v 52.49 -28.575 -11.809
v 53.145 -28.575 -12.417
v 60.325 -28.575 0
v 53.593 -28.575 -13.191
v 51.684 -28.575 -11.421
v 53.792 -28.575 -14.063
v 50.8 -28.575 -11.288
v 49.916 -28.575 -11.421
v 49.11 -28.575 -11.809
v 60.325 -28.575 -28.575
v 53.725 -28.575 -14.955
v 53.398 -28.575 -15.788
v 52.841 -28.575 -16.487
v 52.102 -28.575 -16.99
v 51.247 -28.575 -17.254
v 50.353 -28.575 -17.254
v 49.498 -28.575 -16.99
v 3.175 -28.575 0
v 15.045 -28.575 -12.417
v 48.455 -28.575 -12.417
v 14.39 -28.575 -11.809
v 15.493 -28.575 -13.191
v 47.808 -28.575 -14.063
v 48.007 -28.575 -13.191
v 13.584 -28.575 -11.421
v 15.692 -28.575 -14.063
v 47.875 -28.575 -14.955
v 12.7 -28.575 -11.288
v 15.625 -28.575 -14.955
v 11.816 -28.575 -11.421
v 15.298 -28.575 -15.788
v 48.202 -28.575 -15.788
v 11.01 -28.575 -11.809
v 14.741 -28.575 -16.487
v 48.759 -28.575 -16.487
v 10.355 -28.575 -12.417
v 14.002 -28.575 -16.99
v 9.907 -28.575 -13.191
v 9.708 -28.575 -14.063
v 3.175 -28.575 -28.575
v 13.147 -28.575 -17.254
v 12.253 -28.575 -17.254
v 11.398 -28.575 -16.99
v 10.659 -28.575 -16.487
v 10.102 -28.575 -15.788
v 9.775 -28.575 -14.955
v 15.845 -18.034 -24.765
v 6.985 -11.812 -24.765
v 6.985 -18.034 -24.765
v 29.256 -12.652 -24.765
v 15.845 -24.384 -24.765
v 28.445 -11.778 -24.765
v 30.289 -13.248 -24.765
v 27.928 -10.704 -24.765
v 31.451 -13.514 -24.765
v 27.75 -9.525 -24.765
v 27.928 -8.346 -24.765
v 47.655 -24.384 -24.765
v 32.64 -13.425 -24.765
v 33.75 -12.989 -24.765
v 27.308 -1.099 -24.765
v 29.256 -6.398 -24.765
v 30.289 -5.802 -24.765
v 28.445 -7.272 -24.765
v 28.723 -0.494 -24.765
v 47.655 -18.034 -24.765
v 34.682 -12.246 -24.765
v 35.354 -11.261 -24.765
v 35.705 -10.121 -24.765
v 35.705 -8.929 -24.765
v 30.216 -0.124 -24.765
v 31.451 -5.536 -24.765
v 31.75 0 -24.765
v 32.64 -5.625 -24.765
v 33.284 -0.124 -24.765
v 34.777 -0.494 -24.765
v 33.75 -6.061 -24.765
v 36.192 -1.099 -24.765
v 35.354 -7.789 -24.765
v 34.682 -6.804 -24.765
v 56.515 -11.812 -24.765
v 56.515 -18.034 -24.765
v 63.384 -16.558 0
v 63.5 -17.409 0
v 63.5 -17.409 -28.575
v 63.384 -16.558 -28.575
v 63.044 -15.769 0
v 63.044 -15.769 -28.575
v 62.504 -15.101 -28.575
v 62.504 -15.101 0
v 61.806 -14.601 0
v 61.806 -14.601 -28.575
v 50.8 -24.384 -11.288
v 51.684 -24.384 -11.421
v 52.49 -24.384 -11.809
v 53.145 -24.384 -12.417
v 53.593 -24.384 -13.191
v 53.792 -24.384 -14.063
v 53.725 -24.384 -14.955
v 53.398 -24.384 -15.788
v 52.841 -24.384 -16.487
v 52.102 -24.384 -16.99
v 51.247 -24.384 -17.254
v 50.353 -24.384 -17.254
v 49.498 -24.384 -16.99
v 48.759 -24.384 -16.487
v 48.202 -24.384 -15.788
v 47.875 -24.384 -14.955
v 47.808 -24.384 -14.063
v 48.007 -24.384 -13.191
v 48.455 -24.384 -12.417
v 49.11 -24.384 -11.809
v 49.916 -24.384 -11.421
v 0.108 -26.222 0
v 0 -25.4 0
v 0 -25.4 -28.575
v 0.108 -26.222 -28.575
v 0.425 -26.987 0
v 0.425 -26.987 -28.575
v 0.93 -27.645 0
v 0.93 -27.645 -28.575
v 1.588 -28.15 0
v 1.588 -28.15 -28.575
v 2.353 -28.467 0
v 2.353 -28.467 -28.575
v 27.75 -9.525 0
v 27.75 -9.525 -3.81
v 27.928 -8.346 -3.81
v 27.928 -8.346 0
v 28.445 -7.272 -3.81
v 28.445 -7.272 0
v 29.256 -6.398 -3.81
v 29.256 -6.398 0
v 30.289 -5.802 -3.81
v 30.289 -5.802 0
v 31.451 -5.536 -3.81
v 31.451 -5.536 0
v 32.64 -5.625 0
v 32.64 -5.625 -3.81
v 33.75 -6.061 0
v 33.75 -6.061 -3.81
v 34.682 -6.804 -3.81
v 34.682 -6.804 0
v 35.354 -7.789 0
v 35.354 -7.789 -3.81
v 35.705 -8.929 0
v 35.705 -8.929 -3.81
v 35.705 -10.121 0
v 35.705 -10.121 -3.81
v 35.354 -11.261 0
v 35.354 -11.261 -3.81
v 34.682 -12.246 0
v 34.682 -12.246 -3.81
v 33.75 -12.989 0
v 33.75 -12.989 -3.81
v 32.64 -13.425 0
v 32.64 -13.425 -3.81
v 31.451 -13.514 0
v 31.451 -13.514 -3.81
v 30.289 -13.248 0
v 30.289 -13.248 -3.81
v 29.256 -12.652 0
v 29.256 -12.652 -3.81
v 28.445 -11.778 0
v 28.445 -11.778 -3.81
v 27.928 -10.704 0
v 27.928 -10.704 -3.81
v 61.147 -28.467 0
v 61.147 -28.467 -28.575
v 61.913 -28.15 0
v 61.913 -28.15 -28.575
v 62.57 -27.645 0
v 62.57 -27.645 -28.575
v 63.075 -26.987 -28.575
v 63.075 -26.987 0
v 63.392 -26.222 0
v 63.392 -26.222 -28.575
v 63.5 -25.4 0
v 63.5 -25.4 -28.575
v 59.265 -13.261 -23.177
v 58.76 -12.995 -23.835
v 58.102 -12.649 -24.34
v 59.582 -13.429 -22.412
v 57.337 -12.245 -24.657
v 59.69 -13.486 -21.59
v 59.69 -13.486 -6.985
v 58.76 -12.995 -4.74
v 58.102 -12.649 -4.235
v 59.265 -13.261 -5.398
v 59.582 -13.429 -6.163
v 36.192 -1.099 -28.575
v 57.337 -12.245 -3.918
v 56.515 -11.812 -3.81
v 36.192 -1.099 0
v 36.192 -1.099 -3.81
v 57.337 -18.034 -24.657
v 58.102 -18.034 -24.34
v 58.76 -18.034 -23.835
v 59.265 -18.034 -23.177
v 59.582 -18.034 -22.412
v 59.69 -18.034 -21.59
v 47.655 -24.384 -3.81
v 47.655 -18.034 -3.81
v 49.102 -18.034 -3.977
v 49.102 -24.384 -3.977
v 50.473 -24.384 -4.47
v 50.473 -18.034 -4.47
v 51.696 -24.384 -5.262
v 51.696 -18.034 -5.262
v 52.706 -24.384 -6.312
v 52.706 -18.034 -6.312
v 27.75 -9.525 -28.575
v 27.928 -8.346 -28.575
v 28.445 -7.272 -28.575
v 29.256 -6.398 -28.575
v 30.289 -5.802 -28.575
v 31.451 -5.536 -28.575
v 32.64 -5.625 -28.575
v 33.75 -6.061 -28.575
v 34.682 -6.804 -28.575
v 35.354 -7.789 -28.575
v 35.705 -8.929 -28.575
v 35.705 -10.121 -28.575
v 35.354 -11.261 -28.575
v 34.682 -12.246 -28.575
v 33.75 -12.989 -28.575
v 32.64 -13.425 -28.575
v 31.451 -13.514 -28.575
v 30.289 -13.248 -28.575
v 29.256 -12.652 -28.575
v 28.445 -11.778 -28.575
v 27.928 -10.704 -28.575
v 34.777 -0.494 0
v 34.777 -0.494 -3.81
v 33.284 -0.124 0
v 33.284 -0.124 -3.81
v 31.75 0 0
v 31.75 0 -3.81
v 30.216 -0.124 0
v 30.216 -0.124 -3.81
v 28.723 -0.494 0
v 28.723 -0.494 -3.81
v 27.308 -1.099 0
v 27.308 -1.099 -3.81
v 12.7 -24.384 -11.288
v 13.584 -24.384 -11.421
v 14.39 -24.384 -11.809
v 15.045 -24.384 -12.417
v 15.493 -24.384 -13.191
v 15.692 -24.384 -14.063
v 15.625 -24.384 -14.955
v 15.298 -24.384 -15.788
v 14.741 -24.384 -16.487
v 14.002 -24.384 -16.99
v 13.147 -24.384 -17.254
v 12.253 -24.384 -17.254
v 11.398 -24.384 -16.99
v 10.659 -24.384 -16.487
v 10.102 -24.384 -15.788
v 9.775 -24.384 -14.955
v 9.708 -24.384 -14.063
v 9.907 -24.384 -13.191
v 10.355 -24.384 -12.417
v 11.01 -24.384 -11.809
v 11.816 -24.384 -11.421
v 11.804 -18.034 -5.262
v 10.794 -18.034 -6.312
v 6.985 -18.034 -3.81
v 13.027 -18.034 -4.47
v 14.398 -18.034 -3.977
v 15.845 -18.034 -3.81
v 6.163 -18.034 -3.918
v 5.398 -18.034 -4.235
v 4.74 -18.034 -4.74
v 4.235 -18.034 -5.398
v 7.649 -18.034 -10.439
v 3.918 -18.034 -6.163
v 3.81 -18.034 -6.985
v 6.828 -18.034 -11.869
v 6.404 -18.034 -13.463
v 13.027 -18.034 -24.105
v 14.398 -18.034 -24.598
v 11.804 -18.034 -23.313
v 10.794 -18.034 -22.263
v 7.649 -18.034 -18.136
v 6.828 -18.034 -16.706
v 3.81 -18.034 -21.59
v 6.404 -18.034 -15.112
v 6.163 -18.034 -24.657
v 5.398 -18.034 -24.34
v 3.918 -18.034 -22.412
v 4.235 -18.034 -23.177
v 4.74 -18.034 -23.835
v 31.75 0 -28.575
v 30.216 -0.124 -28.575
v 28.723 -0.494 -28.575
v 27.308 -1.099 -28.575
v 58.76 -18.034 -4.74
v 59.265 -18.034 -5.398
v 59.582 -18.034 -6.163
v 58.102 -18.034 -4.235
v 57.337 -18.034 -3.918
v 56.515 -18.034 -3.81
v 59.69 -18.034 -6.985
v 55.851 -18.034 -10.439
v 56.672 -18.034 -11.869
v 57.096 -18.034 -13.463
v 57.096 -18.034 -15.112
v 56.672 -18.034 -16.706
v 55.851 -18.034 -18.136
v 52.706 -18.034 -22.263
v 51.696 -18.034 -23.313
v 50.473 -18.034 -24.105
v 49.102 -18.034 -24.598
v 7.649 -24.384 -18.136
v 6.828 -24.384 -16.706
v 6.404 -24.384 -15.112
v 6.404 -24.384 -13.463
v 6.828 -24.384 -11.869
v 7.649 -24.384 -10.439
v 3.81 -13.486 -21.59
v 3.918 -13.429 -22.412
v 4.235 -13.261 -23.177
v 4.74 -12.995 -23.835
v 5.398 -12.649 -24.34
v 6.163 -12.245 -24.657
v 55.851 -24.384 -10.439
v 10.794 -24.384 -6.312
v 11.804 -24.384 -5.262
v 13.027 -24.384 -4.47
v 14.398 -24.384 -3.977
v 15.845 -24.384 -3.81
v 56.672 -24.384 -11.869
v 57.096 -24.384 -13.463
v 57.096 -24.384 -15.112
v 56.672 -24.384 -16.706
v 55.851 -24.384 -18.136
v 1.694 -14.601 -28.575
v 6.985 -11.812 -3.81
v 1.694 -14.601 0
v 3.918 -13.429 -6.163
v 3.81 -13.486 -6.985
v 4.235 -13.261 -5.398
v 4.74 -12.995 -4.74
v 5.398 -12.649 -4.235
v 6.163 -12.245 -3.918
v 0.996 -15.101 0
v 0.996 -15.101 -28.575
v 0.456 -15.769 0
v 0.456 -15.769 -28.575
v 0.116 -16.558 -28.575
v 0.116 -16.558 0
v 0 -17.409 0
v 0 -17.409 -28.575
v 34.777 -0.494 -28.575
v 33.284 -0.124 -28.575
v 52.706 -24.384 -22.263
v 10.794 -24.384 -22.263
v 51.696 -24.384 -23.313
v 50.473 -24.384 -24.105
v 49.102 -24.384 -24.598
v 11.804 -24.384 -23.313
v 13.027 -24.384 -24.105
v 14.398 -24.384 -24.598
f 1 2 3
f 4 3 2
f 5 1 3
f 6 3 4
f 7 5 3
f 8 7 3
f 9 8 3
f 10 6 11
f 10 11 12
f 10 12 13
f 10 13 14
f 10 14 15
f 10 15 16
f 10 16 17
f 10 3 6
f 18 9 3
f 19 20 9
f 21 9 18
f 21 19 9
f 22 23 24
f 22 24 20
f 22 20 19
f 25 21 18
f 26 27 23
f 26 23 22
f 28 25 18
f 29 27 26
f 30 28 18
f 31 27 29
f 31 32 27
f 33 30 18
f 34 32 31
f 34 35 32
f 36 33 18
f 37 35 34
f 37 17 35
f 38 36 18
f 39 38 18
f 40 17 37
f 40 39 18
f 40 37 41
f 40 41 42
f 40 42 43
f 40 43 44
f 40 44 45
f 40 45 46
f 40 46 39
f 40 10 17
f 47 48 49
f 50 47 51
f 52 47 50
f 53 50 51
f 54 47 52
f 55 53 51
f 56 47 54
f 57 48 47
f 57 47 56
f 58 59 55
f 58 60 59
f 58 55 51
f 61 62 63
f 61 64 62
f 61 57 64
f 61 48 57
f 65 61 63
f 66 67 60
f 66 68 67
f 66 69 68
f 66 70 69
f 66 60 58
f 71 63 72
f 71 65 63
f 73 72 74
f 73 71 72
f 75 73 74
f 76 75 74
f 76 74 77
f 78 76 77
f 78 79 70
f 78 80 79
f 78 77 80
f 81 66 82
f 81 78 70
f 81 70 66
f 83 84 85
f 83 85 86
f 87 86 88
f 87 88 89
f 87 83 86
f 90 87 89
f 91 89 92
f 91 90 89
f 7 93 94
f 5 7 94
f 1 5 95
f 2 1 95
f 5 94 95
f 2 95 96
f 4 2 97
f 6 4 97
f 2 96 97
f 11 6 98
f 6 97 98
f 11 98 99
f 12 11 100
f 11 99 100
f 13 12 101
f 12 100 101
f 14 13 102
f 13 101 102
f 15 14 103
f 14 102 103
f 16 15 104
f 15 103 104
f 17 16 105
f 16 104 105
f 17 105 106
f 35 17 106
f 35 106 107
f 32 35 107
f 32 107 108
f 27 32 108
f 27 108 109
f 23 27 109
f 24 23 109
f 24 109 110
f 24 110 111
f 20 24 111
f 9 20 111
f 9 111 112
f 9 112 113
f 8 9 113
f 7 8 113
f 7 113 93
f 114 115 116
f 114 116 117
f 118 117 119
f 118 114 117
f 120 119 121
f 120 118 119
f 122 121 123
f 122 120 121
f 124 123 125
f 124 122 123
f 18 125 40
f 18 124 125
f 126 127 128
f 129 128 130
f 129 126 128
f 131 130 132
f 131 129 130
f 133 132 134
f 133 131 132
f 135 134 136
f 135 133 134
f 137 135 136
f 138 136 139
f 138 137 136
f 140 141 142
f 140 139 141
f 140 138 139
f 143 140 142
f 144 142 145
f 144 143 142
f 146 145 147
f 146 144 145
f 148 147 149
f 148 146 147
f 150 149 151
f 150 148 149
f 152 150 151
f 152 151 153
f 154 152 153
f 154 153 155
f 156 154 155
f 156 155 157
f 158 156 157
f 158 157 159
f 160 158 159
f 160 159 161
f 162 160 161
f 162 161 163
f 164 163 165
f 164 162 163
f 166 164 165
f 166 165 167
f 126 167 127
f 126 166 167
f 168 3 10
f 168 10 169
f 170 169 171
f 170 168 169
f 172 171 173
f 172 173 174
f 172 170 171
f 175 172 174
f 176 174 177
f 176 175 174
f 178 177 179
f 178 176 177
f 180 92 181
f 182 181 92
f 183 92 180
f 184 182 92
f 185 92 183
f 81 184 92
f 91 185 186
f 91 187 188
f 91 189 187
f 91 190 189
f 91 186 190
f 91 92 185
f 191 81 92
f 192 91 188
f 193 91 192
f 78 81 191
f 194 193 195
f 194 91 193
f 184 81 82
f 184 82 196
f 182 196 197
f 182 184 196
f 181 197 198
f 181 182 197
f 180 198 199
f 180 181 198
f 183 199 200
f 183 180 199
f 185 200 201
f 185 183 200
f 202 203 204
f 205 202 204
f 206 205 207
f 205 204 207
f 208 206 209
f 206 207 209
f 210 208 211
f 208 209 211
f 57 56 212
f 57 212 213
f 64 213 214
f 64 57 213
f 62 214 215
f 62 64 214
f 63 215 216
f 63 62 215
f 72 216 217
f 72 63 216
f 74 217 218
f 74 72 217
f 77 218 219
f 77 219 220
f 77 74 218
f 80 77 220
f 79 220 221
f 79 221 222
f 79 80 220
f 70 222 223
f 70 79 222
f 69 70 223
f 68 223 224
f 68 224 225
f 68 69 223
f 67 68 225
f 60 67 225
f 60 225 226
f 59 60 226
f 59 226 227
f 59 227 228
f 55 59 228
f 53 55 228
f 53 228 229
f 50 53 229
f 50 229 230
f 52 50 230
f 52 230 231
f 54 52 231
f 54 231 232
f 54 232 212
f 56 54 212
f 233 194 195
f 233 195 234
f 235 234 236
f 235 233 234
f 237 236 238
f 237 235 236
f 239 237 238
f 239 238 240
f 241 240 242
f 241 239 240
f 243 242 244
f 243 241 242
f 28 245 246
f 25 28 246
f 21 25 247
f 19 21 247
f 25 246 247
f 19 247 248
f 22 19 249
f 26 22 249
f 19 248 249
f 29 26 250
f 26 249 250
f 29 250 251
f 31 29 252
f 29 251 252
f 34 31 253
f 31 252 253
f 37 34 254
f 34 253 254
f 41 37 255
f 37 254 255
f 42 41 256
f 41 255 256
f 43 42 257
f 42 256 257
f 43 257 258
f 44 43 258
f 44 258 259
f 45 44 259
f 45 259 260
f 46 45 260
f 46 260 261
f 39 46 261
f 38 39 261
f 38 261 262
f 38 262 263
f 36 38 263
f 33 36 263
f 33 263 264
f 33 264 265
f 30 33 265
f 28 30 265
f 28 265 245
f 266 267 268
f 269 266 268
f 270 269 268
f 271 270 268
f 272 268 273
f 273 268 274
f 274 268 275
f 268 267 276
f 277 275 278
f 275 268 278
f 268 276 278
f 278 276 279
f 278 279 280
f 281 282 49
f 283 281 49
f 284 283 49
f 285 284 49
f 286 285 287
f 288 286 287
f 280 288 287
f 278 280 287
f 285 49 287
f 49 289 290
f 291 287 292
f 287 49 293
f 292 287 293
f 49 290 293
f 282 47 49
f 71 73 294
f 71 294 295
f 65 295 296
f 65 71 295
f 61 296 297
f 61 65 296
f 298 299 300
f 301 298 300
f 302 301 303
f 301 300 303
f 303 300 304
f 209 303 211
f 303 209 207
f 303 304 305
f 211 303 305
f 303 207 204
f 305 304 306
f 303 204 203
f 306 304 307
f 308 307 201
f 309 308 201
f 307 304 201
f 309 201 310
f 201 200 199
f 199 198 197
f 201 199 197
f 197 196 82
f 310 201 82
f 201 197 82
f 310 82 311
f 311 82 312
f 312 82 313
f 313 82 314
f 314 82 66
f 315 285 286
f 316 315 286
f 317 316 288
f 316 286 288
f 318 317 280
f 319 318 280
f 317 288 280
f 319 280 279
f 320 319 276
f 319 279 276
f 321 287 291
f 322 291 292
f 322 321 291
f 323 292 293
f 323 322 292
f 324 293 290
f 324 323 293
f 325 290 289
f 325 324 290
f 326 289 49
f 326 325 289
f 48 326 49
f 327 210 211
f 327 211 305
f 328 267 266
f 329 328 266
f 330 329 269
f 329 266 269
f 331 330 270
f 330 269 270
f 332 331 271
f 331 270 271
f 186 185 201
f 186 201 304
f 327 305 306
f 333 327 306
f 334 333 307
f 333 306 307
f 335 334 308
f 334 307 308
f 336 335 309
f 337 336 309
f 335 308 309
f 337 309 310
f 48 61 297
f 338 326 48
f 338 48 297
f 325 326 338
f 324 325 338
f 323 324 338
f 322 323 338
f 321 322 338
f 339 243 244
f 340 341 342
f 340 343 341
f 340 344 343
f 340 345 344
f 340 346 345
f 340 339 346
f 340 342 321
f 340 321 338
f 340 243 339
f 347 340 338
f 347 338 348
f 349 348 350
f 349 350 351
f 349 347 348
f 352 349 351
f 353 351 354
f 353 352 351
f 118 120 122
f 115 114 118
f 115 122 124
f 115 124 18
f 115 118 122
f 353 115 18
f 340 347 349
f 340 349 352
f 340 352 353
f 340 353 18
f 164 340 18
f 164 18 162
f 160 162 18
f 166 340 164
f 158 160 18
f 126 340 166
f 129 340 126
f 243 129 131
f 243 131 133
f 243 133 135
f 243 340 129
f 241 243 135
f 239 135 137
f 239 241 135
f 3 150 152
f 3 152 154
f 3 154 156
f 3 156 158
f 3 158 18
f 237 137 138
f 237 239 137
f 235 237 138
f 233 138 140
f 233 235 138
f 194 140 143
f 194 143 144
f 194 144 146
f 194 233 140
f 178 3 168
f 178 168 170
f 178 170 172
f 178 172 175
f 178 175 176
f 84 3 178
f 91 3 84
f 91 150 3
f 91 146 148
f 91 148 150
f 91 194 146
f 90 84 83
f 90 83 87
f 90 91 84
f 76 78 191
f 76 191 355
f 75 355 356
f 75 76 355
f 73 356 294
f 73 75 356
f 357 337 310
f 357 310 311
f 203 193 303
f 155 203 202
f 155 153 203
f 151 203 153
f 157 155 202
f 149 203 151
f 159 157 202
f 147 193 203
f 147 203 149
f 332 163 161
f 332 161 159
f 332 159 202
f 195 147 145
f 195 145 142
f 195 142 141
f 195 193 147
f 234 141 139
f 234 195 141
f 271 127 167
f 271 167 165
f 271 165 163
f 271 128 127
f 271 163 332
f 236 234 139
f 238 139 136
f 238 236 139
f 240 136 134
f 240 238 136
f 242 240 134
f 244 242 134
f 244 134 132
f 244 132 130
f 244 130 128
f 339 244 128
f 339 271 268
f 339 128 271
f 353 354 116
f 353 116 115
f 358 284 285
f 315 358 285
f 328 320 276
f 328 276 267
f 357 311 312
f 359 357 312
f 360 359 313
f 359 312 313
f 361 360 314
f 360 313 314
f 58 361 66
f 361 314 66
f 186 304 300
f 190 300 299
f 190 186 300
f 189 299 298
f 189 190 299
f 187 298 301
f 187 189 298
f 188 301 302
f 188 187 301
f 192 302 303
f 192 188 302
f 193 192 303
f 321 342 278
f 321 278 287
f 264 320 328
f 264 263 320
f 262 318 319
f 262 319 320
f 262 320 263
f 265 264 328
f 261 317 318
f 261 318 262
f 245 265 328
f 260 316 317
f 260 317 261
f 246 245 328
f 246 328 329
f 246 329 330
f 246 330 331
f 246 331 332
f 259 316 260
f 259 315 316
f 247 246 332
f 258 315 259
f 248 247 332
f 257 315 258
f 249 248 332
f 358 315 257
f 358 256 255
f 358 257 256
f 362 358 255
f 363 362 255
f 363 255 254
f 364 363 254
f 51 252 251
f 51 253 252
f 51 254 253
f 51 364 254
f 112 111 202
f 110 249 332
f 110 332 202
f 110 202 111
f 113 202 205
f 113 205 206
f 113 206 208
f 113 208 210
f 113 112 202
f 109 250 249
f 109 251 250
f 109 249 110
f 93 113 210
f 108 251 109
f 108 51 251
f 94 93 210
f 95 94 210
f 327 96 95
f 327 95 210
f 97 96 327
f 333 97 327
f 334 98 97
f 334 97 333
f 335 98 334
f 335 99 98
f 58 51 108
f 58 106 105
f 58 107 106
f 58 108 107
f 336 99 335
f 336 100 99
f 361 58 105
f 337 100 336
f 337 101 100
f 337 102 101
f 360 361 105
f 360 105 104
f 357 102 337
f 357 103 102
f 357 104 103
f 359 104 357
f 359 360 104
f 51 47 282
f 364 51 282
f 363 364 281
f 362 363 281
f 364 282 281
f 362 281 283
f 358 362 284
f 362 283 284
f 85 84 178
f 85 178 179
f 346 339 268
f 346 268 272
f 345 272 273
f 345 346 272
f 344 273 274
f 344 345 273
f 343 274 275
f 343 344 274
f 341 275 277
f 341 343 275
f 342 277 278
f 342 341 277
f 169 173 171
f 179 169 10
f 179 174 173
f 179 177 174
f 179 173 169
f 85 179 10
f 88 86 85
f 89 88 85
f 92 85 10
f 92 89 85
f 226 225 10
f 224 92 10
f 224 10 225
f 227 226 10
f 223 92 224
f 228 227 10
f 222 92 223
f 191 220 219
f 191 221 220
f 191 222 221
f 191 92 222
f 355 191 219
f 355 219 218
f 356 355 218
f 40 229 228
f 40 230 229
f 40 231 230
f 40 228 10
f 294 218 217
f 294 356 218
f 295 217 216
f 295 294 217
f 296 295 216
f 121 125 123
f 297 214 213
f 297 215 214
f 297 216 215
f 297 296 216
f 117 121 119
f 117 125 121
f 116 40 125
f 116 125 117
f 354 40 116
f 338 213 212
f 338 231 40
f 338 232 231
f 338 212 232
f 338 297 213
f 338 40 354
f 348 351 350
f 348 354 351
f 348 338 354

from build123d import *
from OCP.BRepAlgoAPI import BRepAlgoAPI_Cut
from OCP.TopTools import TopTools_ListOfShape

# Parameters (mm, degrees)
SKETCH1_R              = 3
BOSS_EXTRUDE1_DEPTH    = 28.575
CUT_EXTRUDE1_DEPTH     = 18.034
CUT_EXTRUDE4_DEPTH     = 6.35
CUT_EXTRUDE5_START     = -28.575
CUT_EXTRUDE5_OUTLINE_R = 4
CUT_EXTRUDE5_DEPTH     = 28.575


with BuildPart() as part:
    # Sketch1 → Boss-Extrude1 (new body)
    with BuildSketch(Plane(origin=(0, 0, 0), x_dir=(1, 0, 0), z_dir=(0, 1, 0))):
        Polygon((0, 6.35), (0, 22.225), (0, 28.575), (6.35, 28.575), (57.15, 28.575), (63.5, 28.575), (63.5, 22.225), (63.5, 6.35), (63.5, 0), (57.15, 0), (6.35, 0), (0, 0), align=None)
        with Locations(Location((12.7, 14.2875, 0), (0, 0, 270))):
            Circle(SKETCH1_R, mode=Mode.SUBTRACT)
        with Locations(Location((50.8, 14.2875, 0), (0, 0, 270))):
            Circle(SKETCH1_R, mode=Mode.SUBTRACT)
    extrude(amount=-BOSS_EXTRUDE1_DEPTH)

    # Sketch2 → Cut-Extrude1 (cut)
    with BuildSketch(Plane(origin=(0, 0, 0), x_dir=(1, 0, 0), z_dir=(0, 1, 0))):
        with BuildLine():
            Line((6.985, 24.765), (56.515, 24.765))
            ThreePointArc((56.515, 24.765), (58.76006403, 23.83506403), (59.69, 21.59))
            Line((59.69, 21.59), (59.69, 6.985))
            ThreePointArc((59.69, 6.985), (58.76006403, 4.73993597), (56.515, 3.81))
            Line((56.515, 3.81), (6.985, 3.81))
            ThreePointArc((6.985, 3.81), (4.73993597, 4.73993597), (3.81, 6.985))
            Line((3.81, 6.985), (3.81, 21.59))
            ThreePointArc((3.81, 21.59), (4.73993597, 23.83506403), (6.985, 24.765))
        make_face()
    extrude(amount=-CUT_EXTRUDE1_DEPTH, mode=Mode.SUBTRACT)

    # Sketch4 → Cut-Extrude4 (cut)
    with BuildSketch(Plane(origin=(0, -18.034, 0), x_dir=(1, 0, 0), z_dir=(0, 1, 0))):
        with BuildLine():
            Line((55.850907282, 18.135984848), (52.706002748, 22.263484848))
            ThreePointArc((52.706002748, 22.263484848), (50.473305999, 24.105359338), (47.655095466, 24.765))
            Line((47.655095466, 24.765), (15.844904534, 24.765))
            ThreePointArc((15.844904534, 24.765), (13.026694001, 24.105359338), (10.793997252, 22.263484848))
            Line((10.793997252, 22.263484848), (7.649092718, 18.135984848))
            ThreePointArc((7.649092718, 18.135984848), (6.35, 14.2875), (7.649092718, 10.439015152))
            Line((7.649092718, 10.439015152), (10.793997252, 6.311515152))
            ThreePointArc((10.793997252, 6.311515152), (13.026694001, 4.469640662), (15.844904534, 3.81))
            Line((15.844904534, 3.81), (47.655095466, 3.81))
            ThreePointArc((47.655095466, 3.81), (50.473305999, 4.469640662), (52.706002748, 6.311515152))
            Line((52.706002748, 6.311515152), (55.850907282, 10.439015152))
            ThreePointArc((55.850907282, 10.439015152), (57.15, 14.2875), (55.850907282, 18.135984848))
        make_face()
    extrude(amount=-CUT_EXTRUDE4_DEPTH, mode=Mode.SUBTRACT)


with BuildPart() as cut_extrude5_tool:
    # Cut-Extrude5: read off the stored shape, not the designer's step
    # Cut-Extrude5 outline → Cut-Extrude5 (new body)
    with BuildSketch(Plane(origin=(0, 0, -28.575), x_dir=(-1, 0, 0), z_dir=(0, 0, -1)).offset(CUT_EXTRUDE5_START)):
        with BuildLine():
            ThreePointArc((-31.75, 4.067e-06), (-29.462231849, -0.278821364), (-27.308403366, -1.098973545))
            Line((-27.308403366, -1.098973545), (-1.694470317, -14.600801413))
            ThreePointArc((-1.694470317, -14.600801413), (-0.456425728, -15.769363319), (-1.896e-06, -17.409475699))
            Line((-1.896e-06, -17.409475699), (0, 0))
            Line((0, 0), (-31.75, 4.067e-06))
        make_face()
        with BuildLine():
            ThreePointArc((-36.191594414, -1.098972375), (-34.037766933, -0.278821063), (-31.75, 4.067e-06))
            Line((-31.75, 4.067e-06), (-63.5, 0))
            Line((-63.5, 0), (-63.500001896, -17.409469074))
            ThreePointArc((-63.500001896, -17.409469074), (-63.043577848, -15.769356336), (-61.805532735, -14.600794399))
            Line((-61.805532735, -14.600794399), (-36.191594414, -1.098972375))
        make_face()
        with BuildLine():
            Line((0, -28.575), (-1.896e-06, -25.399996402))
            ThreePointArc((-1.896e-06, -25.399996402), (-0.929937865, -27.645060432), (-3.175001896, -28.574996402))
            Line((-3.175001896, -28.574996402), (0, -28.575))
        make_face()
        with BuildLine():
            ThreePointArc((-60.325001896, -28.574996402), (-62.570065927, -27.645060433), (-63.500001896, -25.399996402))
            Line((-63.500001896, -25.399996402), (-63.5, -28.575))
            Line((-63.5, -28.575), (-60.325001896, -28.574996402))
        make_face()
        with Locations((-31.75, -9.525)):
            Circle(CUT_EXTRUDE5_OUTLINE_R)
    extrude(amount=CUT_EXTRUDE5_DEPTH)


with BuildPart() as part_1:
    add(part.part)

    # Cut-Extrude5: cut by cut_extrude5_tool, with a tolerance
    cut_extrude5_stock = TopTools_ListOfShape()
    cut_extrude5_stock.Append(part_1.part.wrapped)
    cut_extrude5_tools = TopTools_ListOfShape()
    cut_extrude5_tools.Append(cut_extrude5_tool.part.wrapped)
    cut_extrude5_cut = BRepAlgoAPI_Cut()
    cut_extrude5_cut.SetArguments(cut_extrude5_stock)
    cut_extrude5_cut.SetTools(cut_extrude5_tools)
    cut_extrude5_cut.SetFuzzyValue(0.00001)
    cut_extrude5_cut.Build()
    add(Compound.cast(cut_extrude5_cut.Shape()).solids(), mode=Mode.REPLACE)


solid = part_1.part
